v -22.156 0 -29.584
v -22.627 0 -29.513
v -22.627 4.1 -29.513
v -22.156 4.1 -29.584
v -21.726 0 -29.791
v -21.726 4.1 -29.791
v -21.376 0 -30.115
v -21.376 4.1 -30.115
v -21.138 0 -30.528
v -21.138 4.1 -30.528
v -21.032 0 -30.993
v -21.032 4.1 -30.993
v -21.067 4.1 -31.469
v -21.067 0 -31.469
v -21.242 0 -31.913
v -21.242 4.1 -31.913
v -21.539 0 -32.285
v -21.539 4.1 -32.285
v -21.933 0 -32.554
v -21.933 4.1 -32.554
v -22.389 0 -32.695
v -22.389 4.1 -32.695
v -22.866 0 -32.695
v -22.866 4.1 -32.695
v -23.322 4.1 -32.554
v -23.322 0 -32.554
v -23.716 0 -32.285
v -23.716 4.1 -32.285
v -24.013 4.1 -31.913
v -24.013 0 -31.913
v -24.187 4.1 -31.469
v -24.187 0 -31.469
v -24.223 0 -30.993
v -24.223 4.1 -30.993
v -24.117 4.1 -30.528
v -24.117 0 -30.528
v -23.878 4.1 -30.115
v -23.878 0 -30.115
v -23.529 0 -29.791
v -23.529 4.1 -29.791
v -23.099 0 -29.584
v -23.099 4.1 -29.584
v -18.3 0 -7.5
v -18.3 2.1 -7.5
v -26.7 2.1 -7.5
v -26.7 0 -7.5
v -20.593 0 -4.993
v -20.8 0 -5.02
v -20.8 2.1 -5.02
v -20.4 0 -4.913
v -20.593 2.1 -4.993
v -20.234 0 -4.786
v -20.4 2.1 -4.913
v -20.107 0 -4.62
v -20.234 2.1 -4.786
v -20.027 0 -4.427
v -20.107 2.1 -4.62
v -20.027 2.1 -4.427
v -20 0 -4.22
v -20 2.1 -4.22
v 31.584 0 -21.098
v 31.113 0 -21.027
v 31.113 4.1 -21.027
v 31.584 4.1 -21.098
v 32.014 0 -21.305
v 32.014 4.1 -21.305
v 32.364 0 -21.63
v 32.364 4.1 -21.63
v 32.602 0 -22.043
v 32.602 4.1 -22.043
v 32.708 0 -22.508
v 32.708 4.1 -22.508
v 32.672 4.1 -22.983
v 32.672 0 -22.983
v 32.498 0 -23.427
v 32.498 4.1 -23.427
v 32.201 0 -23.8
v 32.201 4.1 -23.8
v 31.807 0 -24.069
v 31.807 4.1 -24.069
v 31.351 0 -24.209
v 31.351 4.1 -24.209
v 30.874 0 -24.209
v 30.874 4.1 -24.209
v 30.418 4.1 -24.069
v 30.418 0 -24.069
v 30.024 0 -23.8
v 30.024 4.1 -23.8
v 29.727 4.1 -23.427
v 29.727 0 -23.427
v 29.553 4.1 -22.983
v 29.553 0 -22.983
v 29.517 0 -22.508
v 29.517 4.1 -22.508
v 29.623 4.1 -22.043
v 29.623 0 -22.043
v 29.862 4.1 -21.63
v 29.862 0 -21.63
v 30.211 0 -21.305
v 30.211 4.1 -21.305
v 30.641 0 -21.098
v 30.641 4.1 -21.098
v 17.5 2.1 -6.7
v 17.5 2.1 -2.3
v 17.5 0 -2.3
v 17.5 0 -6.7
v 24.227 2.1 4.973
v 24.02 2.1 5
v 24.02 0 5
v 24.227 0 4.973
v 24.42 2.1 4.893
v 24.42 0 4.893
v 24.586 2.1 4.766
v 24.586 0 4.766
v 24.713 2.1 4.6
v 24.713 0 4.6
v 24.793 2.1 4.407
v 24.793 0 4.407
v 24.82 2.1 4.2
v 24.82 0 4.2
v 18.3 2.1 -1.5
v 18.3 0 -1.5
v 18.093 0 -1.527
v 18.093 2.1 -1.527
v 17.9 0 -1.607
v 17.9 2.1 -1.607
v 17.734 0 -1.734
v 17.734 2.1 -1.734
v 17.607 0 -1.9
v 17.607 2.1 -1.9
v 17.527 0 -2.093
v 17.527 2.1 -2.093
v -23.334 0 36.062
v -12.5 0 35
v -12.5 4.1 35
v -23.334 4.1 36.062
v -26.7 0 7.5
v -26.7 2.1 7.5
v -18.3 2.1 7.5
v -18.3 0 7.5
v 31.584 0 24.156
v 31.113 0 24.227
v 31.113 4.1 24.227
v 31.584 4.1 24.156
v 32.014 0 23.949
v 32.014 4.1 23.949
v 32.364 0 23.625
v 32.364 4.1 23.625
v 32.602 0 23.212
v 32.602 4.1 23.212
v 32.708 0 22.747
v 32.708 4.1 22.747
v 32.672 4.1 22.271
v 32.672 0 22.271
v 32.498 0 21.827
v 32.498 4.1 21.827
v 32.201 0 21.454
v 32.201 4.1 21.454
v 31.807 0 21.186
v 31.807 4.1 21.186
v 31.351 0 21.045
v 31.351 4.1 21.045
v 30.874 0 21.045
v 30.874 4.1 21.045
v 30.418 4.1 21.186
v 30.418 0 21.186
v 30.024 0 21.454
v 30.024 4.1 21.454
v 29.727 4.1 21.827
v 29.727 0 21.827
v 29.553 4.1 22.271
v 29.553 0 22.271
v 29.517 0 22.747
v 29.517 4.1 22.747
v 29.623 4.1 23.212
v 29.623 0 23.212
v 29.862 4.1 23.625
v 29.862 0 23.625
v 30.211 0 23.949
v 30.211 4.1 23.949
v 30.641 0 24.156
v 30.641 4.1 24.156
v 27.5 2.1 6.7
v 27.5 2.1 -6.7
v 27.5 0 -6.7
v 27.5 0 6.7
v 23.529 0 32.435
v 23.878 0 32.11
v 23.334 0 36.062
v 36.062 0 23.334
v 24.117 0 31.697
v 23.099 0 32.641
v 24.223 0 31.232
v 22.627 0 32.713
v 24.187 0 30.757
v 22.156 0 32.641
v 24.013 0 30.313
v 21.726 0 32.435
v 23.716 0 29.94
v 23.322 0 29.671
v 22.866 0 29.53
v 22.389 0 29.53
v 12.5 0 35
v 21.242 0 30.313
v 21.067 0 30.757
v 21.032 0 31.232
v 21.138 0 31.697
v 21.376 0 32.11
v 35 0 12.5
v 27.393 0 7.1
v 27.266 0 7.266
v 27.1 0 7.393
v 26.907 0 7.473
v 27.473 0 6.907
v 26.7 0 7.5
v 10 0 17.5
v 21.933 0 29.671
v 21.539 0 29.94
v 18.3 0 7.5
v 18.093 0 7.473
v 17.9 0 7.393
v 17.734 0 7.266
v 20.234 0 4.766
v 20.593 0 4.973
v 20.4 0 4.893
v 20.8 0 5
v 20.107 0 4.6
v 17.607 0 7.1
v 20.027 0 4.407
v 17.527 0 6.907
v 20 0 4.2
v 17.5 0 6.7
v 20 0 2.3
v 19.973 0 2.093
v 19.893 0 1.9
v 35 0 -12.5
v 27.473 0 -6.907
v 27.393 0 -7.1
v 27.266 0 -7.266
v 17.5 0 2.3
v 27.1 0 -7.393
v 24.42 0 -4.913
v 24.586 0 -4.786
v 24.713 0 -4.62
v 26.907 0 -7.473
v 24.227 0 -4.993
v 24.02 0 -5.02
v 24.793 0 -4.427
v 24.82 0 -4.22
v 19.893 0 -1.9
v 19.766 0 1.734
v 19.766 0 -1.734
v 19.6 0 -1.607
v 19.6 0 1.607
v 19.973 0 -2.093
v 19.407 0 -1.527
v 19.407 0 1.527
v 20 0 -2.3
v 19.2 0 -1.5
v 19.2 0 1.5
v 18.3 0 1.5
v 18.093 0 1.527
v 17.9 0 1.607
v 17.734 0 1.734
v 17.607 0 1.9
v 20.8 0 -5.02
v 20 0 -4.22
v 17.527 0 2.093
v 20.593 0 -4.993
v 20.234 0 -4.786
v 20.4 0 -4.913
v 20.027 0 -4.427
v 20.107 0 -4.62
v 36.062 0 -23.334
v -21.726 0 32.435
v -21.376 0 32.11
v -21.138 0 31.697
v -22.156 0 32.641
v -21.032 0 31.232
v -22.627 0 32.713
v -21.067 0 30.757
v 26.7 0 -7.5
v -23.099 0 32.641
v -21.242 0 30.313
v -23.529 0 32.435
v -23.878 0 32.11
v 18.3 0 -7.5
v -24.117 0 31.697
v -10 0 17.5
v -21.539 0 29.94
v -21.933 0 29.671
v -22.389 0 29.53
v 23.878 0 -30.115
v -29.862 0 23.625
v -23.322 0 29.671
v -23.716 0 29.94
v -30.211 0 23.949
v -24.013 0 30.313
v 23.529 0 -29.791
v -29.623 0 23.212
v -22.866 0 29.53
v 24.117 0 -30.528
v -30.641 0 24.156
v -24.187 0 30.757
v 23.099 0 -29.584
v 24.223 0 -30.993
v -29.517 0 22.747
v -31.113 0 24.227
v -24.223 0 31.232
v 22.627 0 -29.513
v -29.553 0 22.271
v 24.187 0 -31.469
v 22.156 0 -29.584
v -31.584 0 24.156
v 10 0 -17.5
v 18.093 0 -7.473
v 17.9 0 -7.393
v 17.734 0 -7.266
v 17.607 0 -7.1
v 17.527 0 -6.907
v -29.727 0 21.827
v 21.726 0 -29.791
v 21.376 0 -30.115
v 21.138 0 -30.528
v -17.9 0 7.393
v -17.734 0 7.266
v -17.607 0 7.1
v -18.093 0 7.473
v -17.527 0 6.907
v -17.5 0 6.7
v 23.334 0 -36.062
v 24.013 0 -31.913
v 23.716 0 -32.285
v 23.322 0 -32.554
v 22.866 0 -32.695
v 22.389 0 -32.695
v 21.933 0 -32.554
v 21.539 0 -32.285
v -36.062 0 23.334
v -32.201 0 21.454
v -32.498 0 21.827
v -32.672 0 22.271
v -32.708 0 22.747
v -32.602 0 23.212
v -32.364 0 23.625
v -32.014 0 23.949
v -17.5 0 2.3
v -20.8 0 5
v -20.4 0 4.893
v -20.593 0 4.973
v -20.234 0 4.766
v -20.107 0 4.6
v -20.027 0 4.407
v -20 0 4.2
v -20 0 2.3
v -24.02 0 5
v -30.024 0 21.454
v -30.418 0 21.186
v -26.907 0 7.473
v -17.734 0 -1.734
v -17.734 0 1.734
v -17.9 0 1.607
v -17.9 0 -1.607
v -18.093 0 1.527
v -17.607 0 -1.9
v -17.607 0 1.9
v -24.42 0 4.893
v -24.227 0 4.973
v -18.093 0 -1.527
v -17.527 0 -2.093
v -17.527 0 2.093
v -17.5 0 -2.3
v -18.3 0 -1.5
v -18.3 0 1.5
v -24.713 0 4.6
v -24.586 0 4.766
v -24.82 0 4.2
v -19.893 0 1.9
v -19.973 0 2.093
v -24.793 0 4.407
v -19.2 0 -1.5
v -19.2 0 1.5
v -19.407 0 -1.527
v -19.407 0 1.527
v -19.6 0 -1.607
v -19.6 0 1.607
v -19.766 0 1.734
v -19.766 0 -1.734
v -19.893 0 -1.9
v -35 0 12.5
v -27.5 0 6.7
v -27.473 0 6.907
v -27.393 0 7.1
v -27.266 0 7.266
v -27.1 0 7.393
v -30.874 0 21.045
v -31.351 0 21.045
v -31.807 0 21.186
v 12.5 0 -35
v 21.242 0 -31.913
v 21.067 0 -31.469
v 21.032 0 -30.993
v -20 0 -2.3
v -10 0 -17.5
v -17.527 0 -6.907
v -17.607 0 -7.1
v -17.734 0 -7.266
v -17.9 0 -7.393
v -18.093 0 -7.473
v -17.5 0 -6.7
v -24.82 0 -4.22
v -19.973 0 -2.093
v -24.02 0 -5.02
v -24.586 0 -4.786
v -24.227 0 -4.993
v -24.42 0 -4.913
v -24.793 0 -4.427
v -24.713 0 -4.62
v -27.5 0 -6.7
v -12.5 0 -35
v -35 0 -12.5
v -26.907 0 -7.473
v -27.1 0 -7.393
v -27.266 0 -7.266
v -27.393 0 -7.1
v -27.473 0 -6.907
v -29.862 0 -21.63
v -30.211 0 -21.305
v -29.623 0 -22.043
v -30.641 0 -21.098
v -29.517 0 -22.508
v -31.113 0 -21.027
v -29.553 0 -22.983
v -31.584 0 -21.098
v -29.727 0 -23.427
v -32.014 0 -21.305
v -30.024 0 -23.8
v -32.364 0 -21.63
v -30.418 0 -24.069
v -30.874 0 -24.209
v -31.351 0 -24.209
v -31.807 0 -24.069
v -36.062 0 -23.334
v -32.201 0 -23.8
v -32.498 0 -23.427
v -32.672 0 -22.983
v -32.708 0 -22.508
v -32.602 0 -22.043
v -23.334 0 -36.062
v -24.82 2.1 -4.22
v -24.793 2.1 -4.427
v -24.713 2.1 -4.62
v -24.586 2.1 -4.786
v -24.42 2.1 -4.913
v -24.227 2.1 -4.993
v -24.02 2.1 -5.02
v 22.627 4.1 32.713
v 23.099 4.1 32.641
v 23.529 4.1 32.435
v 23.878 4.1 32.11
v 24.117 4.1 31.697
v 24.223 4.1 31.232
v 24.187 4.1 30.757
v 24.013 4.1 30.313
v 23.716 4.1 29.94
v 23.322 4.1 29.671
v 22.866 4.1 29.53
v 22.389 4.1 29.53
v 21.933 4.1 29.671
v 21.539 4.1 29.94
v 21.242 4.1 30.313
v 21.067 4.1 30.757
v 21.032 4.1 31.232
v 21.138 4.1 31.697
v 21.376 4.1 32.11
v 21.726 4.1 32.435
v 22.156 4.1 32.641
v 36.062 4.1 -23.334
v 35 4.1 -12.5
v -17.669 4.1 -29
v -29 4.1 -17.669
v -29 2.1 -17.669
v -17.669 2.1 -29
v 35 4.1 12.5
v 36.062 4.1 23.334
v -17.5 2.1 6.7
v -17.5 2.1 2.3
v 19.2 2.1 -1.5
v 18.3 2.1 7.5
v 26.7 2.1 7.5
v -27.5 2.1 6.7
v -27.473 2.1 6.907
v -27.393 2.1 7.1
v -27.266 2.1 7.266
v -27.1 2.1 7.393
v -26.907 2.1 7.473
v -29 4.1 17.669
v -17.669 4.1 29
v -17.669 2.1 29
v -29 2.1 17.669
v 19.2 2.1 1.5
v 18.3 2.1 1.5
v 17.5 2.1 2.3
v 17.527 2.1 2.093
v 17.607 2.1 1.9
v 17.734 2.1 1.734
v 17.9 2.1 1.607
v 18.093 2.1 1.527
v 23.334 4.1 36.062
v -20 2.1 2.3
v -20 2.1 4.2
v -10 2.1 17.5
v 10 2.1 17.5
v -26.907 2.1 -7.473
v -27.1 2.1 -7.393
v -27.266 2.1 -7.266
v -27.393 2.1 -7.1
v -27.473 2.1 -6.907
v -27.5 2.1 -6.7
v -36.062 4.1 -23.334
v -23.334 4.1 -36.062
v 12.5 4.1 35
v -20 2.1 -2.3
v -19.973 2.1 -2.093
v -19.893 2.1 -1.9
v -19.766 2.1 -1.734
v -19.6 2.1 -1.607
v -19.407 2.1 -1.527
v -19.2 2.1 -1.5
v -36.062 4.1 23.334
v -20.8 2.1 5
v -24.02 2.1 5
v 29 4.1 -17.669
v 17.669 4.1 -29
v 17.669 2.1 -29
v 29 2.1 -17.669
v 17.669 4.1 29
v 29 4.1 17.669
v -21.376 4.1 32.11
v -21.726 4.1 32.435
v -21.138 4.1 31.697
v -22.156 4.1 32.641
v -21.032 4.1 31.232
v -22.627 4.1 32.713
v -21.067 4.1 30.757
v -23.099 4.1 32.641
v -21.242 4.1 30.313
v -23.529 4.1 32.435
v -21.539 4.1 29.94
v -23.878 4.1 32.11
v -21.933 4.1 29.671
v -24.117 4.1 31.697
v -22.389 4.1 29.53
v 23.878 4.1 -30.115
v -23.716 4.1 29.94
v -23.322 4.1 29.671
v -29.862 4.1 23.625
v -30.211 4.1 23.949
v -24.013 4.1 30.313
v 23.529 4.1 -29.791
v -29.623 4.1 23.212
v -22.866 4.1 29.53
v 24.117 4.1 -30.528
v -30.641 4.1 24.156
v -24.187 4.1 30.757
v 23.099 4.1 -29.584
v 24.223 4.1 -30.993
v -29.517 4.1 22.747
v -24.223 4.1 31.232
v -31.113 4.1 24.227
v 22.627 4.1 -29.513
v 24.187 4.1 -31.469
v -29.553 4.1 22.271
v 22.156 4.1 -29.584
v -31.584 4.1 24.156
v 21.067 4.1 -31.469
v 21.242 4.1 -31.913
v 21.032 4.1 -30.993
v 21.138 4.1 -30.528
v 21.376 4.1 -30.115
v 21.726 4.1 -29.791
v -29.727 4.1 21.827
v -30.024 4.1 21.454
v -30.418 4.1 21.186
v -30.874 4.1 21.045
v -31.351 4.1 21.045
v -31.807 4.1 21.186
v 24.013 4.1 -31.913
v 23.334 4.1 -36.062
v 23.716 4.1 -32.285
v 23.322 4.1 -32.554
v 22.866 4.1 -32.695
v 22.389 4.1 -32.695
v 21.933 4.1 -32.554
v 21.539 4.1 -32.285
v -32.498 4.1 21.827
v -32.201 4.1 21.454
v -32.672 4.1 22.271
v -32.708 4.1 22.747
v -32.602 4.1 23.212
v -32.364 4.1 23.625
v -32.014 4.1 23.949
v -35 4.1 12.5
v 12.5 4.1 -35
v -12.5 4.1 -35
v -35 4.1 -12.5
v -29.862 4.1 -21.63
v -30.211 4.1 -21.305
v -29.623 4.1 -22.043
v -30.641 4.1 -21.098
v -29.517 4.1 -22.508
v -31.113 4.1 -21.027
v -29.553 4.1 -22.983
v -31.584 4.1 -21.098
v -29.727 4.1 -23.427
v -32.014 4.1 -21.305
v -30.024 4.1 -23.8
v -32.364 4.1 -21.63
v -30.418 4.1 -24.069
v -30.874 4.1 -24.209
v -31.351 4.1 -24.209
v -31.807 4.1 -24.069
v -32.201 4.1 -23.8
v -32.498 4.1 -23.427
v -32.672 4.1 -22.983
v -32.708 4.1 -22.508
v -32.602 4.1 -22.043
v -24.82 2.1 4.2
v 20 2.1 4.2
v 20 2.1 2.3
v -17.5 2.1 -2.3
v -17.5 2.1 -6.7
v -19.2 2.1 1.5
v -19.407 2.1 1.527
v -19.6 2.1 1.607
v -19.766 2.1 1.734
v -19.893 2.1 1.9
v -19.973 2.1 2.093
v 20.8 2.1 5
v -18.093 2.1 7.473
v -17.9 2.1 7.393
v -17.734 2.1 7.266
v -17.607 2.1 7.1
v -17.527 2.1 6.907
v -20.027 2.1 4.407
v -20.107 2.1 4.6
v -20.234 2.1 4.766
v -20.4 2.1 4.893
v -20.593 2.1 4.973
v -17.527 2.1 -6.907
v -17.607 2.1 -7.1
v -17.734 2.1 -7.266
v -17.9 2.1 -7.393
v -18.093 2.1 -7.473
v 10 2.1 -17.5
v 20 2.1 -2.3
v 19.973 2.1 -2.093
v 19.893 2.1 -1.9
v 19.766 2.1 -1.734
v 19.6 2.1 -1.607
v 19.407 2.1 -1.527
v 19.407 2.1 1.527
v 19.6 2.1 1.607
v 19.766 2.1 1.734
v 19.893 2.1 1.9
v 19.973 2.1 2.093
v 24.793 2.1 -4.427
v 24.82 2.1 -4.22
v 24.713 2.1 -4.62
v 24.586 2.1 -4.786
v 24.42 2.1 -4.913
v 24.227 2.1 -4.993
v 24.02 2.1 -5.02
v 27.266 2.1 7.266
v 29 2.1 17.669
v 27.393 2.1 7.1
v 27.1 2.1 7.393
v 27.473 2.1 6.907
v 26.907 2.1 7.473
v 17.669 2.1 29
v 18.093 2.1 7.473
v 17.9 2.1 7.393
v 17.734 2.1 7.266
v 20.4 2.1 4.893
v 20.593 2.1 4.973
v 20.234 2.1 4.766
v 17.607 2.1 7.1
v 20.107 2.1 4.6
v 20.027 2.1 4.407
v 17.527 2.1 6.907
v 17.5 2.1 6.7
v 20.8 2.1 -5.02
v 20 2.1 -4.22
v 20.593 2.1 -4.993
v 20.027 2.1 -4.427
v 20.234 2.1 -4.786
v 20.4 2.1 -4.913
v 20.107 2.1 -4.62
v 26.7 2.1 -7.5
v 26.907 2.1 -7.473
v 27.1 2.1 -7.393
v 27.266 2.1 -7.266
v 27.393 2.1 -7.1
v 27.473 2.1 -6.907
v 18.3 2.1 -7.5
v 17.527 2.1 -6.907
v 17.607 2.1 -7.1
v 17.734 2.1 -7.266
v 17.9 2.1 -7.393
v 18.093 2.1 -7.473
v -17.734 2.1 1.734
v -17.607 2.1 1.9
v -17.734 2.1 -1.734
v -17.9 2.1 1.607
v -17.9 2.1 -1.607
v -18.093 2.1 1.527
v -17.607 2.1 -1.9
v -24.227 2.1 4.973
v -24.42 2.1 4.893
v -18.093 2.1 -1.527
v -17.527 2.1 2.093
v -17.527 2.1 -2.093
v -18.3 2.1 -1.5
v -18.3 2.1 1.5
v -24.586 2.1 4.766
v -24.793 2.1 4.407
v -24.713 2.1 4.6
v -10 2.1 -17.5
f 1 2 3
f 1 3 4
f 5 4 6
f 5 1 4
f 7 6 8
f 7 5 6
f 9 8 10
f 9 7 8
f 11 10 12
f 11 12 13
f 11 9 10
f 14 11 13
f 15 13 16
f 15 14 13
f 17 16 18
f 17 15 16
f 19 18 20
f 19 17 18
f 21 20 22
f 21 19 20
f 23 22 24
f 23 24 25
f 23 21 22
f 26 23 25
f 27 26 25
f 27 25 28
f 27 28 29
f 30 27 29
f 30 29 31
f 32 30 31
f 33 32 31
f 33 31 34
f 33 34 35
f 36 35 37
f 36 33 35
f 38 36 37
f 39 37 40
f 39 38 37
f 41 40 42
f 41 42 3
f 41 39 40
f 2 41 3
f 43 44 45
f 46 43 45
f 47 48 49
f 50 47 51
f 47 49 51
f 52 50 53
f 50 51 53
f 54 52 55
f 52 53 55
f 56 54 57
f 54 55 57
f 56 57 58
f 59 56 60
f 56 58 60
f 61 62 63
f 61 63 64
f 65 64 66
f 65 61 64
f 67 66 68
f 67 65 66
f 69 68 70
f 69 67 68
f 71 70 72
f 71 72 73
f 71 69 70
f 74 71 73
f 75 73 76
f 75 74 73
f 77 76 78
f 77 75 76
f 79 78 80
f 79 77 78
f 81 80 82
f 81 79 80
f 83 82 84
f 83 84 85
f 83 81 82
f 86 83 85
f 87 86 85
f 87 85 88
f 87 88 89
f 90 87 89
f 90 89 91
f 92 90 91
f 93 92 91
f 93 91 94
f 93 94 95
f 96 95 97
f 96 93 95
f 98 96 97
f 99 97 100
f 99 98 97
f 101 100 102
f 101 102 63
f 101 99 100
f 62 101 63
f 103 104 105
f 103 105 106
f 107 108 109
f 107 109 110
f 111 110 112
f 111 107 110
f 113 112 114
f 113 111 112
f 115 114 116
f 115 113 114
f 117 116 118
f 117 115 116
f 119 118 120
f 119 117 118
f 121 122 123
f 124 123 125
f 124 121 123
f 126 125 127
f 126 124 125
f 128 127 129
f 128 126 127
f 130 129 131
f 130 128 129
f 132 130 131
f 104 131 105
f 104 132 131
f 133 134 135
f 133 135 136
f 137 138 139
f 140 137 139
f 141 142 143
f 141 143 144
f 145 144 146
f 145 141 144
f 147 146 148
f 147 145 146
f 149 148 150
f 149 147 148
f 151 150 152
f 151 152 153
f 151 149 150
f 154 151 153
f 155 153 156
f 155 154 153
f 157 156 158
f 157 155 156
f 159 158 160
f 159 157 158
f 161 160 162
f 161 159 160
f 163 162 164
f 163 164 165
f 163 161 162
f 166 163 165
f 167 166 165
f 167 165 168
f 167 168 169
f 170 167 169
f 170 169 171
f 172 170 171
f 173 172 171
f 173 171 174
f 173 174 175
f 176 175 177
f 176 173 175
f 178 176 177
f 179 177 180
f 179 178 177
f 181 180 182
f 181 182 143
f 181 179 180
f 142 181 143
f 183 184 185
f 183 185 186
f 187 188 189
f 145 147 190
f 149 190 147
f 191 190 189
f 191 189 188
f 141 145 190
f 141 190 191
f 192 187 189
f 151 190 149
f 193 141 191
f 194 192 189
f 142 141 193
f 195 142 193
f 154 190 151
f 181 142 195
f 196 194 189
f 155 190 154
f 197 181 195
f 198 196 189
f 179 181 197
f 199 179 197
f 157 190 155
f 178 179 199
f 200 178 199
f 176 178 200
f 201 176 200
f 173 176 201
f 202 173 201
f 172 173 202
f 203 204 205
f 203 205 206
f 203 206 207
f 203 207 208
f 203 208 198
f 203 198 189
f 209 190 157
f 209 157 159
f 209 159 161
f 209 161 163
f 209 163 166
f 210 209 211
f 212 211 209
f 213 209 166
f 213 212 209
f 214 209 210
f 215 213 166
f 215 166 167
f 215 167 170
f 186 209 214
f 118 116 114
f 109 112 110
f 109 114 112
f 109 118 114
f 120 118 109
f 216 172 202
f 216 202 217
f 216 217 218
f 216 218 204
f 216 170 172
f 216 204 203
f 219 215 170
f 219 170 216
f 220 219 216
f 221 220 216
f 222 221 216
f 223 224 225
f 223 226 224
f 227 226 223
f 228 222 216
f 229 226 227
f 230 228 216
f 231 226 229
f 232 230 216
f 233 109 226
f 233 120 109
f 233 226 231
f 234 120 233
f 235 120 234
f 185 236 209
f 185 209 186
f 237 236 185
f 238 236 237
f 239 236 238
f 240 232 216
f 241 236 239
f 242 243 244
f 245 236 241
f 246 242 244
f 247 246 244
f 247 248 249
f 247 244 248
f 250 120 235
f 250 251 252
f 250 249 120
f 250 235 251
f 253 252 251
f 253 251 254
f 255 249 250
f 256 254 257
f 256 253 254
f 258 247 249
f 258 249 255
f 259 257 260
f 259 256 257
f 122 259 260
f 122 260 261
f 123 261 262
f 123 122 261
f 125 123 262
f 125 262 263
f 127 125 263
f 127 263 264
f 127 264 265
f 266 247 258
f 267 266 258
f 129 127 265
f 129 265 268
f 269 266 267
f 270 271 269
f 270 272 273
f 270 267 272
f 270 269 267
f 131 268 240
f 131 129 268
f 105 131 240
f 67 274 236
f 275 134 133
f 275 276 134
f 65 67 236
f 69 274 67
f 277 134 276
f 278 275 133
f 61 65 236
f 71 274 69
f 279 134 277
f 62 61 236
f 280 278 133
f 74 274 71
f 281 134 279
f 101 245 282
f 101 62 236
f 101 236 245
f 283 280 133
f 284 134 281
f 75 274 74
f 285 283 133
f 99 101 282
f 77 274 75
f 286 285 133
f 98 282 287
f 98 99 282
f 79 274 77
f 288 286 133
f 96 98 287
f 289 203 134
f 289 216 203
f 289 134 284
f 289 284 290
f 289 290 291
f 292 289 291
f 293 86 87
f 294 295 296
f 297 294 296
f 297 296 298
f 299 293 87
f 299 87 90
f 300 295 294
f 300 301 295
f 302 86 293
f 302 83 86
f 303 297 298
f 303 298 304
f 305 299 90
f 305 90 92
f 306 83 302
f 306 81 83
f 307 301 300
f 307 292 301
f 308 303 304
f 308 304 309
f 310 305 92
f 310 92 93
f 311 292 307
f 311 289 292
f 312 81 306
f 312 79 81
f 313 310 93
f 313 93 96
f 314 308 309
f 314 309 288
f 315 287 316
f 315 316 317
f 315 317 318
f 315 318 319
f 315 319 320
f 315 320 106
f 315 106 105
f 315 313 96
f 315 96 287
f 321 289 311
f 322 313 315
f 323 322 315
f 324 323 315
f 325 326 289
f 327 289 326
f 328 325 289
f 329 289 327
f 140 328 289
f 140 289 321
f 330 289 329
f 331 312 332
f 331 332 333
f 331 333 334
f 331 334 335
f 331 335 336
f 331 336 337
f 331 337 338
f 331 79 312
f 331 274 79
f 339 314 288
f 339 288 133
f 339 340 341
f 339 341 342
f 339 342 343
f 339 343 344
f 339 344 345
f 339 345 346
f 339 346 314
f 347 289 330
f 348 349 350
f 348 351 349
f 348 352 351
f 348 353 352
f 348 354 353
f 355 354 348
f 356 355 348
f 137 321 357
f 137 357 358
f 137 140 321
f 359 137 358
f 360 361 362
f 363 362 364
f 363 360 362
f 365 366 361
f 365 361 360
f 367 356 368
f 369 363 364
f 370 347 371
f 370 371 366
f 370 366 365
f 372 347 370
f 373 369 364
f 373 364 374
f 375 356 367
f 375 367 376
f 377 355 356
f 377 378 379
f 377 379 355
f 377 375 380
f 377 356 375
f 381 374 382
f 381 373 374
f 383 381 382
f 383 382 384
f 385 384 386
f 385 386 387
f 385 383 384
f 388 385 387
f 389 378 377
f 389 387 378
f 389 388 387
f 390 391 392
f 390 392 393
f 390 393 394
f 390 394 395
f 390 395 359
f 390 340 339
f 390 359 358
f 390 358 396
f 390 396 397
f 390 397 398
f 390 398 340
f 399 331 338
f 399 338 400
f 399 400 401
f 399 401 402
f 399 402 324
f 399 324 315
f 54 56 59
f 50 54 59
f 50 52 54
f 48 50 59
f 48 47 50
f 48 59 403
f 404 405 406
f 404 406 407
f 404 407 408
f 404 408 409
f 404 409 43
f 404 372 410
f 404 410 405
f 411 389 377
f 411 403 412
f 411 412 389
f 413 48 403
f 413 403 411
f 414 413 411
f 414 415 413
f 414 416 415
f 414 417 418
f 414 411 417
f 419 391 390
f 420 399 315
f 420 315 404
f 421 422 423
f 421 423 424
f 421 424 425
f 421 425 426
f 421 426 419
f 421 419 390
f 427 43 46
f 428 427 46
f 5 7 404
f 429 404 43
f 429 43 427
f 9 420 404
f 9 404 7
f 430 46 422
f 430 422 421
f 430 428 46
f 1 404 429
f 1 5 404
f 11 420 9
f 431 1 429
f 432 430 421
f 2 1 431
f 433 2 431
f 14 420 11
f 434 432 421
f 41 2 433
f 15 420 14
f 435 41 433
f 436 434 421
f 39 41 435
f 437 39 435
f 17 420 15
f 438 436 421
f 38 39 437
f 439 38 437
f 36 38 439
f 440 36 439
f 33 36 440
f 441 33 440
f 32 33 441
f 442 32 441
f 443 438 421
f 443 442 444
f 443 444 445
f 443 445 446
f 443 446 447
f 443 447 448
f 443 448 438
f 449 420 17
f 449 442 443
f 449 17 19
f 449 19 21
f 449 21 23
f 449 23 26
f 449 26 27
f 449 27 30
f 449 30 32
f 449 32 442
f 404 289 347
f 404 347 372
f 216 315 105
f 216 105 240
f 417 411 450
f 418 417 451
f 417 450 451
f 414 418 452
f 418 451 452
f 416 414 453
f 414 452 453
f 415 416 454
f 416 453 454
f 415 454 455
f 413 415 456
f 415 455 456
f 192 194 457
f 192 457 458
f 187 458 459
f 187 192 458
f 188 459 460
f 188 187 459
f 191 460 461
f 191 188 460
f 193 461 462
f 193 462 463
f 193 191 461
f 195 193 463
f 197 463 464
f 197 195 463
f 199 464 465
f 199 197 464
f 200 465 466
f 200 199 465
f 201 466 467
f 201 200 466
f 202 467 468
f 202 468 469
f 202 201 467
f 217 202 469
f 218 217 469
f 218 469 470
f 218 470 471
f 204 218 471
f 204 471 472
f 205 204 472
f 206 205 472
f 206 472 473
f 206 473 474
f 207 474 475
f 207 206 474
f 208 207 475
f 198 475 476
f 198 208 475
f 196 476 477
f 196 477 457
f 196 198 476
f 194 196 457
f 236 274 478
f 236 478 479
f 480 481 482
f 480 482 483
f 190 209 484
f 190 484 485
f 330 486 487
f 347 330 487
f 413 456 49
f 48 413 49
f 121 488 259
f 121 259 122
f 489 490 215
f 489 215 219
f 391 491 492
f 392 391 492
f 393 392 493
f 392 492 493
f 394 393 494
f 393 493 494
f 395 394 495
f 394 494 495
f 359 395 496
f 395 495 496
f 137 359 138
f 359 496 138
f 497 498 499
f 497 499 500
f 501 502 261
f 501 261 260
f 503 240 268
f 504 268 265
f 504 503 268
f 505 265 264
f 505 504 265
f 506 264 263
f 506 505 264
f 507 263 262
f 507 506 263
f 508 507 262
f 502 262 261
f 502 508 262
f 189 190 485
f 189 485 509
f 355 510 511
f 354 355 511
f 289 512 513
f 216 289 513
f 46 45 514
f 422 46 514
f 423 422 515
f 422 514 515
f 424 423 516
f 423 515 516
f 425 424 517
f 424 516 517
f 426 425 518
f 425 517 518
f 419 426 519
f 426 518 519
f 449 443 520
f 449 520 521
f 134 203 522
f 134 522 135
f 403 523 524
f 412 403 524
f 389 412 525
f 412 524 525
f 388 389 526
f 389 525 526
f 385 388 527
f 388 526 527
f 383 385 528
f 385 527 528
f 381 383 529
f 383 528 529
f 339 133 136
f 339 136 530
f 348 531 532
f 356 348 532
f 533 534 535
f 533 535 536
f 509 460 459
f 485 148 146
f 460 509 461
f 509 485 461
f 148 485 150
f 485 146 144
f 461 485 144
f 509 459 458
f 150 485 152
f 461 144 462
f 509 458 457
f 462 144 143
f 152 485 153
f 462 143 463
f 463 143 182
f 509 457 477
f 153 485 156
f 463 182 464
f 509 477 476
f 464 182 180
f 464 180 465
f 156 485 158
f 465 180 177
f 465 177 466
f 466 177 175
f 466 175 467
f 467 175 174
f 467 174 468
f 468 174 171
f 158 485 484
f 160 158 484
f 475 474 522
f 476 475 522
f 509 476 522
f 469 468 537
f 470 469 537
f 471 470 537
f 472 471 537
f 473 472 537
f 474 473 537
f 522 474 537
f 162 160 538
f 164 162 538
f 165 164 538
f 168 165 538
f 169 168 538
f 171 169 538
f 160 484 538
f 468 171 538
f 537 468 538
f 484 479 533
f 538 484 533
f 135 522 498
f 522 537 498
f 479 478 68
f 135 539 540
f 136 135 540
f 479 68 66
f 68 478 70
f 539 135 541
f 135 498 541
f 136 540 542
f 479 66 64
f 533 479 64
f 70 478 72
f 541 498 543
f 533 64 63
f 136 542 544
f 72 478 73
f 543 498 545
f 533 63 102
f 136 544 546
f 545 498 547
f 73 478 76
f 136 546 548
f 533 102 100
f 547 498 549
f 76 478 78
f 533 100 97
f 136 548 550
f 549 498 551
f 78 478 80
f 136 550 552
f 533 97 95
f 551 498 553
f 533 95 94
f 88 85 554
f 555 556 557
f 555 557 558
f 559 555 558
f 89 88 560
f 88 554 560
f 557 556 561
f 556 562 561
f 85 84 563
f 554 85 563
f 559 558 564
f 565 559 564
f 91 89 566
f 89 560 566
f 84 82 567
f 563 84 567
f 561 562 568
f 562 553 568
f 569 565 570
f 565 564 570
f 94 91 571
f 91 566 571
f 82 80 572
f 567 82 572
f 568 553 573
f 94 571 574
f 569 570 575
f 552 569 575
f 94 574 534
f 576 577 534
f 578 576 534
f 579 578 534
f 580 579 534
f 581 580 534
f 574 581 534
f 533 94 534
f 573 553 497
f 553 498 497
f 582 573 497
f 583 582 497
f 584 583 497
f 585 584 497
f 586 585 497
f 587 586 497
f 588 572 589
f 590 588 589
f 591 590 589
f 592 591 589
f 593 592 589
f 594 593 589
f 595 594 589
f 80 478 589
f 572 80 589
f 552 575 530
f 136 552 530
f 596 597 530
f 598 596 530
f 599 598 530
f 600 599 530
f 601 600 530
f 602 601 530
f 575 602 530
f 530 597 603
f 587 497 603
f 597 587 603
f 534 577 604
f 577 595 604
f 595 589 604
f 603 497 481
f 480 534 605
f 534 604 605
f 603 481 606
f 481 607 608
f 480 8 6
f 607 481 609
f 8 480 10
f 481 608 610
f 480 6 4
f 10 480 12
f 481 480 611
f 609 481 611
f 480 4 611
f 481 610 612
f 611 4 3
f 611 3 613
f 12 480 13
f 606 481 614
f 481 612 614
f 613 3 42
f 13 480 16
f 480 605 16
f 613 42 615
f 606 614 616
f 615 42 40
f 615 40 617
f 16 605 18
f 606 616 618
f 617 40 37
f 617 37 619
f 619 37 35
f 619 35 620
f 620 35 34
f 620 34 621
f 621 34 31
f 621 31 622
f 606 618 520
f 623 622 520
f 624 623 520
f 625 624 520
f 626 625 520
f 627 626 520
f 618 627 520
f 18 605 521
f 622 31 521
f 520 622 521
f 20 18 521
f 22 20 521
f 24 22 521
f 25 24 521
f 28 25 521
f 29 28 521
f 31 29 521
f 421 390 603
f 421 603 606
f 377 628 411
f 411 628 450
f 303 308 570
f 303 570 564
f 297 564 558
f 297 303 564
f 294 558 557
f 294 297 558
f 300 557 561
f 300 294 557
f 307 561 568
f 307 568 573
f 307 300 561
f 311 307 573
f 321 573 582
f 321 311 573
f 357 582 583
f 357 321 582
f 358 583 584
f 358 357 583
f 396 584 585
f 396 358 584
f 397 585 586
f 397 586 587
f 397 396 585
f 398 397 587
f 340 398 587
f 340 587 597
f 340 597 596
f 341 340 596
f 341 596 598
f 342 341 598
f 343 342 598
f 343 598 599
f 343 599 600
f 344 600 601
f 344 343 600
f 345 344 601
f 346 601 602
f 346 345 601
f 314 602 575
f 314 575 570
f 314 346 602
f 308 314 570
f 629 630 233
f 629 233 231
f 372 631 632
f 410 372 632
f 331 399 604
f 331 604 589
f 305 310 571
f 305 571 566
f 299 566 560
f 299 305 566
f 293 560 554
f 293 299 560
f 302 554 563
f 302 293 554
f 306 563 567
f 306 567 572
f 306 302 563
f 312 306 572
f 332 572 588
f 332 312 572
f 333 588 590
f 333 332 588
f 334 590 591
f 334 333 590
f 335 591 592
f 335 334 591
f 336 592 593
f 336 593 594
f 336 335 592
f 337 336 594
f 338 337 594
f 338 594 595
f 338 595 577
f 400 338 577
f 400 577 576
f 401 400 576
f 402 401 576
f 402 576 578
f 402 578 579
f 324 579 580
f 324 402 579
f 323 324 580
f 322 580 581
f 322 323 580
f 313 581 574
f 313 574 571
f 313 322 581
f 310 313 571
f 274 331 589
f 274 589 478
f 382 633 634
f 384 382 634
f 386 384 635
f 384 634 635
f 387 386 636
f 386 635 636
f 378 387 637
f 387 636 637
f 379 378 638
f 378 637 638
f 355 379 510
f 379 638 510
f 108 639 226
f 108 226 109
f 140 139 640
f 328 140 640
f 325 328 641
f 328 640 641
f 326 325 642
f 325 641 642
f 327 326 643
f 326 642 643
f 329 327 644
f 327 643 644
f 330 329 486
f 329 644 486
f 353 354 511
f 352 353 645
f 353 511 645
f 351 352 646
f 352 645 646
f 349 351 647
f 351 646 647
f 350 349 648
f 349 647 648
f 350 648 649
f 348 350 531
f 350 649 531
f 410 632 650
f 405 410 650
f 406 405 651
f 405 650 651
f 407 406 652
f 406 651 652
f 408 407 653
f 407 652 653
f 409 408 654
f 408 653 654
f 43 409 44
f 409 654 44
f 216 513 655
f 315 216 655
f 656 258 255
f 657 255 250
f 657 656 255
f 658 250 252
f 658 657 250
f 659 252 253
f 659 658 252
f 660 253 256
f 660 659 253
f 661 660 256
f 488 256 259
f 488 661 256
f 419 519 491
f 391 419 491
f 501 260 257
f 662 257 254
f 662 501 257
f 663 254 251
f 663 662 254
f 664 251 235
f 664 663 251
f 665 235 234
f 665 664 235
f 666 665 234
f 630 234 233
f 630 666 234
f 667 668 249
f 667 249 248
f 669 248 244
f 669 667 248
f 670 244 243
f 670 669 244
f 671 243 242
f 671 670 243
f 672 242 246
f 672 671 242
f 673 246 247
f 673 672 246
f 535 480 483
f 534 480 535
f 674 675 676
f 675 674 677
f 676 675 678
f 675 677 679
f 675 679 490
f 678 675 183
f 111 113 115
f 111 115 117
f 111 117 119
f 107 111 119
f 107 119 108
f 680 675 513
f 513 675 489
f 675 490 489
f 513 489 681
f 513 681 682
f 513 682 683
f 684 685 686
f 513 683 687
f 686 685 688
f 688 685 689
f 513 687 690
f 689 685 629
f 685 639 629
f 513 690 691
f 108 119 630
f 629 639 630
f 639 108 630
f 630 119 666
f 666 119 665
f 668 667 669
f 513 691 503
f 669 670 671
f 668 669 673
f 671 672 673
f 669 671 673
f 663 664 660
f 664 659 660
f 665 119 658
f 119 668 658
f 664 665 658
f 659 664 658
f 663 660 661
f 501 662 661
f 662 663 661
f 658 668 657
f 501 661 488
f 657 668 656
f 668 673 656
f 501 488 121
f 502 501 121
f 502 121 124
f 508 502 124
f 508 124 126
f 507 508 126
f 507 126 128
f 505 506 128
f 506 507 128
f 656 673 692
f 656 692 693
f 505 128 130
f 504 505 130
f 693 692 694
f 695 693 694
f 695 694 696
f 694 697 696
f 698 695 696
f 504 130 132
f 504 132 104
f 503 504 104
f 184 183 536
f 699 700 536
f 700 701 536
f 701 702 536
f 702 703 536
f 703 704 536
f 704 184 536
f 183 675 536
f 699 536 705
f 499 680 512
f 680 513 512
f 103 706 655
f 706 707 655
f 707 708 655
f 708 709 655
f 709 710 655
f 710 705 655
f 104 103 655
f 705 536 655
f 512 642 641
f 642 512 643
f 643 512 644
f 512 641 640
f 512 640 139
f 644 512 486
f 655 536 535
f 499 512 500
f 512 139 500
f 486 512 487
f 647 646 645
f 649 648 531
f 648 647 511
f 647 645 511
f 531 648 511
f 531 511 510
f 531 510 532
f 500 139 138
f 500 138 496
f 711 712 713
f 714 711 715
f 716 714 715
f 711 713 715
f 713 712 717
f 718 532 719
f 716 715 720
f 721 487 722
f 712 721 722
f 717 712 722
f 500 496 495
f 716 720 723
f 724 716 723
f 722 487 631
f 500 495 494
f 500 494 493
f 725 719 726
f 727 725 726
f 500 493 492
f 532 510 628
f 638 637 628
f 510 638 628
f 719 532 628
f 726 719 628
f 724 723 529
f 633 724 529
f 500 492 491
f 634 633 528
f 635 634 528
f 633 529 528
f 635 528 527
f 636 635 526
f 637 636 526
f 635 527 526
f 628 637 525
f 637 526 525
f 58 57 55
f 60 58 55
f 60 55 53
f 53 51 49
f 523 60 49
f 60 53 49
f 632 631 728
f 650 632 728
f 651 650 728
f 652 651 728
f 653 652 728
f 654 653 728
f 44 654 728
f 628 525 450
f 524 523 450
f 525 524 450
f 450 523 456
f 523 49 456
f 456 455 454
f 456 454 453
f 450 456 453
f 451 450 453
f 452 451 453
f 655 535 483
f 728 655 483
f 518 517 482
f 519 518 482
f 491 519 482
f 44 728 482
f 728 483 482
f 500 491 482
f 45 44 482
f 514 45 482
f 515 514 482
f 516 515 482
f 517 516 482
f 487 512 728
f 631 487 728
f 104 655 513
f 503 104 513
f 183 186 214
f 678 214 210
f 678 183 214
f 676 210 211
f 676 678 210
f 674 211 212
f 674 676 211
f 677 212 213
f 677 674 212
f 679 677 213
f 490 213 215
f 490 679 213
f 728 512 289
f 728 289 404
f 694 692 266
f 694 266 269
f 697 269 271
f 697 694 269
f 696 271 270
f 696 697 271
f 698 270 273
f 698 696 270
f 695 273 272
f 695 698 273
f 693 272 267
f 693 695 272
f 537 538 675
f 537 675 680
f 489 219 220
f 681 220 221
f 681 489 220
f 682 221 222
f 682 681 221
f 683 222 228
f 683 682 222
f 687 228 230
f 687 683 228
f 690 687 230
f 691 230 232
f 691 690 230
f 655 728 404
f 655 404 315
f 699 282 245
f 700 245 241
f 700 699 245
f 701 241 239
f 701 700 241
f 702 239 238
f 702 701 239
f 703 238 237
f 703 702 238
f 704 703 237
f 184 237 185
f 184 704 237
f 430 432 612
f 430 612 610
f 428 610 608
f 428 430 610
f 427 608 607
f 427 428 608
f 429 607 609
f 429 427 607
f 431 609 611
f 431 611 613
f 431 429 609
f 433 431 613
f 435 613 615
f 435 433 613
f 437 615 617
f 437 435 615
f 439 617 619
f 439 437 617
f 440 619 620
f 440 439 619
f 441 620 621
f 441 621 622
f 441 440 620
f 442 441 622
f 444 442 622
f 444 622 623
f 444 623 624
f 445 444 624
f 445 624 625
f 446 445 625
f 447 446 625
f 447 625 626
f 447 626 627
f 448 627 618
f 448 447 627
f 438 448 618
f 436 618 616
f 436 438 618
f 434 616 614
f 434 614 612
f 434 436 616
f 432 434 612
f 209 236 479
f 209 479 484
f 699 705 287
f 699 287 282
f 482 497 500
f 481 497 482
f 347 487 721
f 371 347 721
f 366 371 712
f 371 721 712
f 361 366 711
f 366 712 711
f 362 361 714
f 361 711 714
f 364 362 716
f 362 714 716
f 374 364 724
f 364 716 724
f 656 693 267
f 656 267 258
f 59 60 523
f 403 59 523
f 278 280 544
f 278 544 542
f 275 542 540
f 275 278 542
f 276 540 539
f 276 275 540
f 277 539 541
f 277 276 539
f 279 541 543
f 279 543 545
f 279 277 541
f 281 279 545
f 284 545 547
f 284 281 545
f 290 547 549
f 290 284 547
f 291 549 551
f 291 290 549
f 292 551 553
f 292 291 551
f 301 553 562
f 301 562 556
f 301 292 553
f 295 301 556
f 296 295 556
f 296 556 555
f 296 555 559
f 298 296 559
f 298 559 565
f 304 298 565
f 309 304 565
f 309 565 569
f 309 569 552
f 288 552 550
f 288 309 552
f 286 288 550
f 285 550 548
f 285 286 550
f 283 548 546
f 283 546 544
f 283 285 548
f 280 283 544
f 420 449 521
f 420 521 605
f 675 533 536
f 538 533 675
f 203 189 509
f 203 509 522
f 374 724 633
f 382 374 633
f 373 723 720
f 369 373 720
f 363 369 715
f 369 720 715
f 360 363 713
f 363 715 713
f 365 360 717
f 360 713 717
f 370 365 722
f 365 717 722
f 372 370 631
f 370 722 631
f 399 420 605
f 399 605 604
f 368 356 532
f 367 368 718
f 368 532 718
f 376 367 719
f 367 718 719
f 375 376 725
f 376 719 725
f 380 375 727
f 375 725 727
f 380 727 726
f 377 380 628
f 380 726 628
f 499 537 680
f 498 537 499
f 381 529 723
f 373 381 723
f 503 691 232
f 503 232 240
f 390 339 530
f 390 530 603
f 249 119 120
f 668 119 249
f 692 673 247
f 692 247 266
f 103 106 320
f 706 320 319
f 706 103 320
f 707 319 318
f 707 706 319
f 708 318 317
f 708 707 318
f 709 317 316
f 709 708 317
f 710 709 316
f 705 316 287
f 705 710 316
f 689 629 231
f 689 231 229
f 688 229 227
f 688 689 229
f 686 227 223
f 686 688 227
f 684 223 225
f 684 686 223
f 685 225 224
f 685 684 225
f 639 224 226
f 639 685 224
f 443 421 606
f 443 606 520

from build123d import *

# Parameters (mm, degrees)
SKETCH1_R           = 1.6
BOSS_EXTRUDE1_DEPTH = 4.1
CUT_EXTRUDE1_DEPTH  = 2
CUT_EXTRUDE2_DEPTH  = 52.043042311
SKETCH4_W           = 20
SKETCH4_H           = 35
CUT_EXTRUDE3_DEPTH  = 52.043042311


with BuildPart() as part:
    # Sketch1 → Boss-Extrude1 (new body)
    with BuildSketch(Plane(origin=(0, 0, 0), x_dir=(1, 0, 0), z_dir=(0, 1, 0))):
        Polygon((-35, 12.5), (-36.062322224, 23.334400163), (-23.334400163, 36.062322224), (-12.5, 35), (12.5, 35), (23.334400163, 36.062322224), (36.062322224, 23.334400163), (35, 12.5), (35, -12.5), (36.062322224, -23.334400163), (23.334400163, -36.062322224), (12.5, -35), (-12.5, -35), (-23.334400163, -36.062322224), (-36.062322224, -23.334400163), (-35, -12.5), align=None)
        with Locations(Location((22.627293382, 31.112574756, 0), (0, 0, 270))):
            Circle(SKETCH1_R, mode=Mode.SUBTRACT)
        with Locations(Location((31.112574756, 22.627293382, 0), (0, 0, 270))):
            Circle(SKETCH1_R, mode=Mode.SUBTRACT)
        with Locations(Location((31.112574756, -22.627293382, 0), (0, 0, 270))):
            Circle(SKETCH1_R, mode=Mode.SUBTRACT)
        with Locations(Location((22.627293382, -31.112574756, 0), (0, 0, 270))):
            Circle(SKETCH1_R, mode=Mode.SUBTRACT)
        with Locations(Location((-22.627293382, -31.112574756, 0), (0, 0, 270))):
            Circle(SKETCH1_R, mode=Mode.SUBTRACT)
        with Locations(Location((-31.112574756, -22.627293382, 0), (0, 0, 270))):
            Circle(SKETCH1_R, mode=Mode.SUBTRACT)
        with Locations(Location((-31.112574756, 22.627293382, 0), (0, 0, 270))):
            Circle(SKETCH1_R, mode=Mode.SUBTRACT)
        with Locations(Location((-22.627293382, 31.112574756, 0), (0, 0, 270))):
            Circle(SKETCH1_R, mode=Mode.SUBTRACT)
    extrude(amount=BOSS_EXTRUDE1_DEPTH)

    # Sketch2 → Cut-Extrude1 (cut)
    with BuildSketch(Plane(origin=(0, 4.1, 0), x_dir=(1, 0, 0), z_dir=(0, 1, 0))):
        Polygon((-17.668800325, 29), (17.668800325, 29), (29, 17.668800325), (29, -17.668800325), (17.668800325, -29), (-17.668800325, -29), (-29, -17.668800325), (-29, 17.668800325), align=None)
    extrude(amount=-CUT_EXTRUDE1_DEPTH, mode=Mode.SUBTRACT)

    # Sketch3 → Cut-Extrude2 (cut, through all)
    with BuildSketch(Plane(origin=(0, 2.1, 0), x_dir=(1, 0, 0), z_dir=(0, 1, 0))):
        with BuildLine():
            Line((-27.5, 6.7), (-27.5, -6.7))
            ThreePointArc((-27.5, -6.7), (-27.265685425, -7.265685425), (-26.7, -7.5))
            Line((-26.7, -7.5), (-18.3, -7.5))
            ThreePointArc((-18.3, -7.5), (-17.734314575, -7.265685425), (-17.5, -6.7))
            Line((-17.5, -6.7), (-17.5, -2.3))
            ThreePointArc((-17.5, -2.3), (-17.734314575, -1.734314575), (-18.3, -1.5))
            Line((-18.3, -1.5), (-19.2, -1.5))
            ThreePointArc((-19.2, -1.5), (-19.765685425, -1.734314575), (-20, -2.3))
            Line((-20, -2.3), (-20, -4.2))
            ThreePointArc((-20, -4.2), (-20.234314575, -4.765685425), (-20.8, -5))
            Line((-20.8, -5), (-24.02, -5))
            ThreePointArc((-24.02, -5), (-24.585685425, -4.765685425), (-24.82, -4.2))
            Line((-24.82, -4.2), (-24.82, 4.22))
            ThreePointArc((-24.82, 4.22), (-24.585685425, 4.785685425), (-24.02, 5.02))
            Line((-24.02, 5.02), (-20.8, 5.02))
            ThreePointArc((-20.8, 5.02), (-20.234314575, 4.785685425), (-20, 4.22))
            Line((-20, 4.22), (-20, 2.3))
            ThreePointArc((-20, 2.3), (-19.765685425, 1.734314575), (-19.2, 1.5))
            Line((-19.2, 1.5), (-18.3, 1.5))
            ThreePointArc((-18.3, 1.5), (-17.734314575, 1.734314575), (-17.5, 2.3))
            Line((-17.5, 2.3), (-17.5, 6.7))
            ThreePointArc((-17.5, 6.7), (-17.734314575, 7.265685425), (-18.3, 7.5))
            Line((-18.3, 7.5), (-26.7, 7.5))
            ThreePointArc((-26.7, 7.5), (-27.265685425, 7.265685425), (-27.5, 6.7))
        make_face()
        with BuildLine():
            Line((18.3, 7.5), (26.7, 7.5))
            ThreePointArc((26.7, 7.5), (27.265685425, 7.265685425), (27.5, 6.7))
            Line((27.5, 6.7), (27.5, -6.7))
            ThreePointArc((27.5, -6.7), (27.265685425, -7.265685425), (26.7, -7.5))
            Line((26.7, -7.5), (18.3, -7.5))
            ThreePointArc((18.3, -7.5), (17.734314575, -7.265685425), (17.5, -6.7))
            Line((17.5, -6.7), (17.5, -2.3))
            ThreePointArc((17.5, -2.3), (17.734314575, -1.734314575), (18.3, -1.5))
            Line((18.3, -1.5), (19.2, -1.5))
            ThreePointArc((19.2, -1.5), (19.765685425, -1.734314575), (20, -2.3))
            Line((20, -2.3), (20, -4.2))
            ThreePointArc((20, -4.2), (20.234314575, -4.765685425), (20.8, -5))
            Line((20.8, -5), (24.02, -5))
            ThreePointArc((24.02, -5), (24.585685425, -4.765685425), (24.82, -4.2))
            Line((24.82, -4.2), (24.82, 4.22))
            ThreePointArc((24.82, 4.22), (24.585685425, 4.785685425), (24.02, 5.02))
            Line((24.02, 5.02), (20.8, 5.02))
            ThreePointArc((20.8, 5.02), (20.234314575, 4.785685425), (20, 4.22))
            Line((20, 4.22), (20, 2.3))
            ThreePointArc((20, 2.3), (19.765685425, 1.734314575), (19.2, 1.5))
            Line((19.2, 1.5), (18.3, 1.5))
            ThreePointArc((18.3, 1.5), (17.734314575, 1.734314575), (17.5, 2.3))
            Line((17.5, 2.3), (17.5, 6.7))
            ThreePointArc((17.5, 6.7), (17.734314575, 7.265685425), (18.3, 7.5))
        make_face()
    extrude(amount=-CUT_EXTRUDE2_DEPTH, mode=Mode.SUBTRACT)

    # Sketch4 → Cut-Extrude3 (cut, through all)
    with BuildSketch(Plane(origin=(0, 2.1, 0), x_dir=(1, 0, 0), z_dir=(0, 1, 0))):
        Rectangle(SKETCH4_W, SKETCH4_H)
    extrude(amount=-CUT_EXTRUDE3_DEPTH, mode=Mode.SUBTRACT)


solid = part.part
